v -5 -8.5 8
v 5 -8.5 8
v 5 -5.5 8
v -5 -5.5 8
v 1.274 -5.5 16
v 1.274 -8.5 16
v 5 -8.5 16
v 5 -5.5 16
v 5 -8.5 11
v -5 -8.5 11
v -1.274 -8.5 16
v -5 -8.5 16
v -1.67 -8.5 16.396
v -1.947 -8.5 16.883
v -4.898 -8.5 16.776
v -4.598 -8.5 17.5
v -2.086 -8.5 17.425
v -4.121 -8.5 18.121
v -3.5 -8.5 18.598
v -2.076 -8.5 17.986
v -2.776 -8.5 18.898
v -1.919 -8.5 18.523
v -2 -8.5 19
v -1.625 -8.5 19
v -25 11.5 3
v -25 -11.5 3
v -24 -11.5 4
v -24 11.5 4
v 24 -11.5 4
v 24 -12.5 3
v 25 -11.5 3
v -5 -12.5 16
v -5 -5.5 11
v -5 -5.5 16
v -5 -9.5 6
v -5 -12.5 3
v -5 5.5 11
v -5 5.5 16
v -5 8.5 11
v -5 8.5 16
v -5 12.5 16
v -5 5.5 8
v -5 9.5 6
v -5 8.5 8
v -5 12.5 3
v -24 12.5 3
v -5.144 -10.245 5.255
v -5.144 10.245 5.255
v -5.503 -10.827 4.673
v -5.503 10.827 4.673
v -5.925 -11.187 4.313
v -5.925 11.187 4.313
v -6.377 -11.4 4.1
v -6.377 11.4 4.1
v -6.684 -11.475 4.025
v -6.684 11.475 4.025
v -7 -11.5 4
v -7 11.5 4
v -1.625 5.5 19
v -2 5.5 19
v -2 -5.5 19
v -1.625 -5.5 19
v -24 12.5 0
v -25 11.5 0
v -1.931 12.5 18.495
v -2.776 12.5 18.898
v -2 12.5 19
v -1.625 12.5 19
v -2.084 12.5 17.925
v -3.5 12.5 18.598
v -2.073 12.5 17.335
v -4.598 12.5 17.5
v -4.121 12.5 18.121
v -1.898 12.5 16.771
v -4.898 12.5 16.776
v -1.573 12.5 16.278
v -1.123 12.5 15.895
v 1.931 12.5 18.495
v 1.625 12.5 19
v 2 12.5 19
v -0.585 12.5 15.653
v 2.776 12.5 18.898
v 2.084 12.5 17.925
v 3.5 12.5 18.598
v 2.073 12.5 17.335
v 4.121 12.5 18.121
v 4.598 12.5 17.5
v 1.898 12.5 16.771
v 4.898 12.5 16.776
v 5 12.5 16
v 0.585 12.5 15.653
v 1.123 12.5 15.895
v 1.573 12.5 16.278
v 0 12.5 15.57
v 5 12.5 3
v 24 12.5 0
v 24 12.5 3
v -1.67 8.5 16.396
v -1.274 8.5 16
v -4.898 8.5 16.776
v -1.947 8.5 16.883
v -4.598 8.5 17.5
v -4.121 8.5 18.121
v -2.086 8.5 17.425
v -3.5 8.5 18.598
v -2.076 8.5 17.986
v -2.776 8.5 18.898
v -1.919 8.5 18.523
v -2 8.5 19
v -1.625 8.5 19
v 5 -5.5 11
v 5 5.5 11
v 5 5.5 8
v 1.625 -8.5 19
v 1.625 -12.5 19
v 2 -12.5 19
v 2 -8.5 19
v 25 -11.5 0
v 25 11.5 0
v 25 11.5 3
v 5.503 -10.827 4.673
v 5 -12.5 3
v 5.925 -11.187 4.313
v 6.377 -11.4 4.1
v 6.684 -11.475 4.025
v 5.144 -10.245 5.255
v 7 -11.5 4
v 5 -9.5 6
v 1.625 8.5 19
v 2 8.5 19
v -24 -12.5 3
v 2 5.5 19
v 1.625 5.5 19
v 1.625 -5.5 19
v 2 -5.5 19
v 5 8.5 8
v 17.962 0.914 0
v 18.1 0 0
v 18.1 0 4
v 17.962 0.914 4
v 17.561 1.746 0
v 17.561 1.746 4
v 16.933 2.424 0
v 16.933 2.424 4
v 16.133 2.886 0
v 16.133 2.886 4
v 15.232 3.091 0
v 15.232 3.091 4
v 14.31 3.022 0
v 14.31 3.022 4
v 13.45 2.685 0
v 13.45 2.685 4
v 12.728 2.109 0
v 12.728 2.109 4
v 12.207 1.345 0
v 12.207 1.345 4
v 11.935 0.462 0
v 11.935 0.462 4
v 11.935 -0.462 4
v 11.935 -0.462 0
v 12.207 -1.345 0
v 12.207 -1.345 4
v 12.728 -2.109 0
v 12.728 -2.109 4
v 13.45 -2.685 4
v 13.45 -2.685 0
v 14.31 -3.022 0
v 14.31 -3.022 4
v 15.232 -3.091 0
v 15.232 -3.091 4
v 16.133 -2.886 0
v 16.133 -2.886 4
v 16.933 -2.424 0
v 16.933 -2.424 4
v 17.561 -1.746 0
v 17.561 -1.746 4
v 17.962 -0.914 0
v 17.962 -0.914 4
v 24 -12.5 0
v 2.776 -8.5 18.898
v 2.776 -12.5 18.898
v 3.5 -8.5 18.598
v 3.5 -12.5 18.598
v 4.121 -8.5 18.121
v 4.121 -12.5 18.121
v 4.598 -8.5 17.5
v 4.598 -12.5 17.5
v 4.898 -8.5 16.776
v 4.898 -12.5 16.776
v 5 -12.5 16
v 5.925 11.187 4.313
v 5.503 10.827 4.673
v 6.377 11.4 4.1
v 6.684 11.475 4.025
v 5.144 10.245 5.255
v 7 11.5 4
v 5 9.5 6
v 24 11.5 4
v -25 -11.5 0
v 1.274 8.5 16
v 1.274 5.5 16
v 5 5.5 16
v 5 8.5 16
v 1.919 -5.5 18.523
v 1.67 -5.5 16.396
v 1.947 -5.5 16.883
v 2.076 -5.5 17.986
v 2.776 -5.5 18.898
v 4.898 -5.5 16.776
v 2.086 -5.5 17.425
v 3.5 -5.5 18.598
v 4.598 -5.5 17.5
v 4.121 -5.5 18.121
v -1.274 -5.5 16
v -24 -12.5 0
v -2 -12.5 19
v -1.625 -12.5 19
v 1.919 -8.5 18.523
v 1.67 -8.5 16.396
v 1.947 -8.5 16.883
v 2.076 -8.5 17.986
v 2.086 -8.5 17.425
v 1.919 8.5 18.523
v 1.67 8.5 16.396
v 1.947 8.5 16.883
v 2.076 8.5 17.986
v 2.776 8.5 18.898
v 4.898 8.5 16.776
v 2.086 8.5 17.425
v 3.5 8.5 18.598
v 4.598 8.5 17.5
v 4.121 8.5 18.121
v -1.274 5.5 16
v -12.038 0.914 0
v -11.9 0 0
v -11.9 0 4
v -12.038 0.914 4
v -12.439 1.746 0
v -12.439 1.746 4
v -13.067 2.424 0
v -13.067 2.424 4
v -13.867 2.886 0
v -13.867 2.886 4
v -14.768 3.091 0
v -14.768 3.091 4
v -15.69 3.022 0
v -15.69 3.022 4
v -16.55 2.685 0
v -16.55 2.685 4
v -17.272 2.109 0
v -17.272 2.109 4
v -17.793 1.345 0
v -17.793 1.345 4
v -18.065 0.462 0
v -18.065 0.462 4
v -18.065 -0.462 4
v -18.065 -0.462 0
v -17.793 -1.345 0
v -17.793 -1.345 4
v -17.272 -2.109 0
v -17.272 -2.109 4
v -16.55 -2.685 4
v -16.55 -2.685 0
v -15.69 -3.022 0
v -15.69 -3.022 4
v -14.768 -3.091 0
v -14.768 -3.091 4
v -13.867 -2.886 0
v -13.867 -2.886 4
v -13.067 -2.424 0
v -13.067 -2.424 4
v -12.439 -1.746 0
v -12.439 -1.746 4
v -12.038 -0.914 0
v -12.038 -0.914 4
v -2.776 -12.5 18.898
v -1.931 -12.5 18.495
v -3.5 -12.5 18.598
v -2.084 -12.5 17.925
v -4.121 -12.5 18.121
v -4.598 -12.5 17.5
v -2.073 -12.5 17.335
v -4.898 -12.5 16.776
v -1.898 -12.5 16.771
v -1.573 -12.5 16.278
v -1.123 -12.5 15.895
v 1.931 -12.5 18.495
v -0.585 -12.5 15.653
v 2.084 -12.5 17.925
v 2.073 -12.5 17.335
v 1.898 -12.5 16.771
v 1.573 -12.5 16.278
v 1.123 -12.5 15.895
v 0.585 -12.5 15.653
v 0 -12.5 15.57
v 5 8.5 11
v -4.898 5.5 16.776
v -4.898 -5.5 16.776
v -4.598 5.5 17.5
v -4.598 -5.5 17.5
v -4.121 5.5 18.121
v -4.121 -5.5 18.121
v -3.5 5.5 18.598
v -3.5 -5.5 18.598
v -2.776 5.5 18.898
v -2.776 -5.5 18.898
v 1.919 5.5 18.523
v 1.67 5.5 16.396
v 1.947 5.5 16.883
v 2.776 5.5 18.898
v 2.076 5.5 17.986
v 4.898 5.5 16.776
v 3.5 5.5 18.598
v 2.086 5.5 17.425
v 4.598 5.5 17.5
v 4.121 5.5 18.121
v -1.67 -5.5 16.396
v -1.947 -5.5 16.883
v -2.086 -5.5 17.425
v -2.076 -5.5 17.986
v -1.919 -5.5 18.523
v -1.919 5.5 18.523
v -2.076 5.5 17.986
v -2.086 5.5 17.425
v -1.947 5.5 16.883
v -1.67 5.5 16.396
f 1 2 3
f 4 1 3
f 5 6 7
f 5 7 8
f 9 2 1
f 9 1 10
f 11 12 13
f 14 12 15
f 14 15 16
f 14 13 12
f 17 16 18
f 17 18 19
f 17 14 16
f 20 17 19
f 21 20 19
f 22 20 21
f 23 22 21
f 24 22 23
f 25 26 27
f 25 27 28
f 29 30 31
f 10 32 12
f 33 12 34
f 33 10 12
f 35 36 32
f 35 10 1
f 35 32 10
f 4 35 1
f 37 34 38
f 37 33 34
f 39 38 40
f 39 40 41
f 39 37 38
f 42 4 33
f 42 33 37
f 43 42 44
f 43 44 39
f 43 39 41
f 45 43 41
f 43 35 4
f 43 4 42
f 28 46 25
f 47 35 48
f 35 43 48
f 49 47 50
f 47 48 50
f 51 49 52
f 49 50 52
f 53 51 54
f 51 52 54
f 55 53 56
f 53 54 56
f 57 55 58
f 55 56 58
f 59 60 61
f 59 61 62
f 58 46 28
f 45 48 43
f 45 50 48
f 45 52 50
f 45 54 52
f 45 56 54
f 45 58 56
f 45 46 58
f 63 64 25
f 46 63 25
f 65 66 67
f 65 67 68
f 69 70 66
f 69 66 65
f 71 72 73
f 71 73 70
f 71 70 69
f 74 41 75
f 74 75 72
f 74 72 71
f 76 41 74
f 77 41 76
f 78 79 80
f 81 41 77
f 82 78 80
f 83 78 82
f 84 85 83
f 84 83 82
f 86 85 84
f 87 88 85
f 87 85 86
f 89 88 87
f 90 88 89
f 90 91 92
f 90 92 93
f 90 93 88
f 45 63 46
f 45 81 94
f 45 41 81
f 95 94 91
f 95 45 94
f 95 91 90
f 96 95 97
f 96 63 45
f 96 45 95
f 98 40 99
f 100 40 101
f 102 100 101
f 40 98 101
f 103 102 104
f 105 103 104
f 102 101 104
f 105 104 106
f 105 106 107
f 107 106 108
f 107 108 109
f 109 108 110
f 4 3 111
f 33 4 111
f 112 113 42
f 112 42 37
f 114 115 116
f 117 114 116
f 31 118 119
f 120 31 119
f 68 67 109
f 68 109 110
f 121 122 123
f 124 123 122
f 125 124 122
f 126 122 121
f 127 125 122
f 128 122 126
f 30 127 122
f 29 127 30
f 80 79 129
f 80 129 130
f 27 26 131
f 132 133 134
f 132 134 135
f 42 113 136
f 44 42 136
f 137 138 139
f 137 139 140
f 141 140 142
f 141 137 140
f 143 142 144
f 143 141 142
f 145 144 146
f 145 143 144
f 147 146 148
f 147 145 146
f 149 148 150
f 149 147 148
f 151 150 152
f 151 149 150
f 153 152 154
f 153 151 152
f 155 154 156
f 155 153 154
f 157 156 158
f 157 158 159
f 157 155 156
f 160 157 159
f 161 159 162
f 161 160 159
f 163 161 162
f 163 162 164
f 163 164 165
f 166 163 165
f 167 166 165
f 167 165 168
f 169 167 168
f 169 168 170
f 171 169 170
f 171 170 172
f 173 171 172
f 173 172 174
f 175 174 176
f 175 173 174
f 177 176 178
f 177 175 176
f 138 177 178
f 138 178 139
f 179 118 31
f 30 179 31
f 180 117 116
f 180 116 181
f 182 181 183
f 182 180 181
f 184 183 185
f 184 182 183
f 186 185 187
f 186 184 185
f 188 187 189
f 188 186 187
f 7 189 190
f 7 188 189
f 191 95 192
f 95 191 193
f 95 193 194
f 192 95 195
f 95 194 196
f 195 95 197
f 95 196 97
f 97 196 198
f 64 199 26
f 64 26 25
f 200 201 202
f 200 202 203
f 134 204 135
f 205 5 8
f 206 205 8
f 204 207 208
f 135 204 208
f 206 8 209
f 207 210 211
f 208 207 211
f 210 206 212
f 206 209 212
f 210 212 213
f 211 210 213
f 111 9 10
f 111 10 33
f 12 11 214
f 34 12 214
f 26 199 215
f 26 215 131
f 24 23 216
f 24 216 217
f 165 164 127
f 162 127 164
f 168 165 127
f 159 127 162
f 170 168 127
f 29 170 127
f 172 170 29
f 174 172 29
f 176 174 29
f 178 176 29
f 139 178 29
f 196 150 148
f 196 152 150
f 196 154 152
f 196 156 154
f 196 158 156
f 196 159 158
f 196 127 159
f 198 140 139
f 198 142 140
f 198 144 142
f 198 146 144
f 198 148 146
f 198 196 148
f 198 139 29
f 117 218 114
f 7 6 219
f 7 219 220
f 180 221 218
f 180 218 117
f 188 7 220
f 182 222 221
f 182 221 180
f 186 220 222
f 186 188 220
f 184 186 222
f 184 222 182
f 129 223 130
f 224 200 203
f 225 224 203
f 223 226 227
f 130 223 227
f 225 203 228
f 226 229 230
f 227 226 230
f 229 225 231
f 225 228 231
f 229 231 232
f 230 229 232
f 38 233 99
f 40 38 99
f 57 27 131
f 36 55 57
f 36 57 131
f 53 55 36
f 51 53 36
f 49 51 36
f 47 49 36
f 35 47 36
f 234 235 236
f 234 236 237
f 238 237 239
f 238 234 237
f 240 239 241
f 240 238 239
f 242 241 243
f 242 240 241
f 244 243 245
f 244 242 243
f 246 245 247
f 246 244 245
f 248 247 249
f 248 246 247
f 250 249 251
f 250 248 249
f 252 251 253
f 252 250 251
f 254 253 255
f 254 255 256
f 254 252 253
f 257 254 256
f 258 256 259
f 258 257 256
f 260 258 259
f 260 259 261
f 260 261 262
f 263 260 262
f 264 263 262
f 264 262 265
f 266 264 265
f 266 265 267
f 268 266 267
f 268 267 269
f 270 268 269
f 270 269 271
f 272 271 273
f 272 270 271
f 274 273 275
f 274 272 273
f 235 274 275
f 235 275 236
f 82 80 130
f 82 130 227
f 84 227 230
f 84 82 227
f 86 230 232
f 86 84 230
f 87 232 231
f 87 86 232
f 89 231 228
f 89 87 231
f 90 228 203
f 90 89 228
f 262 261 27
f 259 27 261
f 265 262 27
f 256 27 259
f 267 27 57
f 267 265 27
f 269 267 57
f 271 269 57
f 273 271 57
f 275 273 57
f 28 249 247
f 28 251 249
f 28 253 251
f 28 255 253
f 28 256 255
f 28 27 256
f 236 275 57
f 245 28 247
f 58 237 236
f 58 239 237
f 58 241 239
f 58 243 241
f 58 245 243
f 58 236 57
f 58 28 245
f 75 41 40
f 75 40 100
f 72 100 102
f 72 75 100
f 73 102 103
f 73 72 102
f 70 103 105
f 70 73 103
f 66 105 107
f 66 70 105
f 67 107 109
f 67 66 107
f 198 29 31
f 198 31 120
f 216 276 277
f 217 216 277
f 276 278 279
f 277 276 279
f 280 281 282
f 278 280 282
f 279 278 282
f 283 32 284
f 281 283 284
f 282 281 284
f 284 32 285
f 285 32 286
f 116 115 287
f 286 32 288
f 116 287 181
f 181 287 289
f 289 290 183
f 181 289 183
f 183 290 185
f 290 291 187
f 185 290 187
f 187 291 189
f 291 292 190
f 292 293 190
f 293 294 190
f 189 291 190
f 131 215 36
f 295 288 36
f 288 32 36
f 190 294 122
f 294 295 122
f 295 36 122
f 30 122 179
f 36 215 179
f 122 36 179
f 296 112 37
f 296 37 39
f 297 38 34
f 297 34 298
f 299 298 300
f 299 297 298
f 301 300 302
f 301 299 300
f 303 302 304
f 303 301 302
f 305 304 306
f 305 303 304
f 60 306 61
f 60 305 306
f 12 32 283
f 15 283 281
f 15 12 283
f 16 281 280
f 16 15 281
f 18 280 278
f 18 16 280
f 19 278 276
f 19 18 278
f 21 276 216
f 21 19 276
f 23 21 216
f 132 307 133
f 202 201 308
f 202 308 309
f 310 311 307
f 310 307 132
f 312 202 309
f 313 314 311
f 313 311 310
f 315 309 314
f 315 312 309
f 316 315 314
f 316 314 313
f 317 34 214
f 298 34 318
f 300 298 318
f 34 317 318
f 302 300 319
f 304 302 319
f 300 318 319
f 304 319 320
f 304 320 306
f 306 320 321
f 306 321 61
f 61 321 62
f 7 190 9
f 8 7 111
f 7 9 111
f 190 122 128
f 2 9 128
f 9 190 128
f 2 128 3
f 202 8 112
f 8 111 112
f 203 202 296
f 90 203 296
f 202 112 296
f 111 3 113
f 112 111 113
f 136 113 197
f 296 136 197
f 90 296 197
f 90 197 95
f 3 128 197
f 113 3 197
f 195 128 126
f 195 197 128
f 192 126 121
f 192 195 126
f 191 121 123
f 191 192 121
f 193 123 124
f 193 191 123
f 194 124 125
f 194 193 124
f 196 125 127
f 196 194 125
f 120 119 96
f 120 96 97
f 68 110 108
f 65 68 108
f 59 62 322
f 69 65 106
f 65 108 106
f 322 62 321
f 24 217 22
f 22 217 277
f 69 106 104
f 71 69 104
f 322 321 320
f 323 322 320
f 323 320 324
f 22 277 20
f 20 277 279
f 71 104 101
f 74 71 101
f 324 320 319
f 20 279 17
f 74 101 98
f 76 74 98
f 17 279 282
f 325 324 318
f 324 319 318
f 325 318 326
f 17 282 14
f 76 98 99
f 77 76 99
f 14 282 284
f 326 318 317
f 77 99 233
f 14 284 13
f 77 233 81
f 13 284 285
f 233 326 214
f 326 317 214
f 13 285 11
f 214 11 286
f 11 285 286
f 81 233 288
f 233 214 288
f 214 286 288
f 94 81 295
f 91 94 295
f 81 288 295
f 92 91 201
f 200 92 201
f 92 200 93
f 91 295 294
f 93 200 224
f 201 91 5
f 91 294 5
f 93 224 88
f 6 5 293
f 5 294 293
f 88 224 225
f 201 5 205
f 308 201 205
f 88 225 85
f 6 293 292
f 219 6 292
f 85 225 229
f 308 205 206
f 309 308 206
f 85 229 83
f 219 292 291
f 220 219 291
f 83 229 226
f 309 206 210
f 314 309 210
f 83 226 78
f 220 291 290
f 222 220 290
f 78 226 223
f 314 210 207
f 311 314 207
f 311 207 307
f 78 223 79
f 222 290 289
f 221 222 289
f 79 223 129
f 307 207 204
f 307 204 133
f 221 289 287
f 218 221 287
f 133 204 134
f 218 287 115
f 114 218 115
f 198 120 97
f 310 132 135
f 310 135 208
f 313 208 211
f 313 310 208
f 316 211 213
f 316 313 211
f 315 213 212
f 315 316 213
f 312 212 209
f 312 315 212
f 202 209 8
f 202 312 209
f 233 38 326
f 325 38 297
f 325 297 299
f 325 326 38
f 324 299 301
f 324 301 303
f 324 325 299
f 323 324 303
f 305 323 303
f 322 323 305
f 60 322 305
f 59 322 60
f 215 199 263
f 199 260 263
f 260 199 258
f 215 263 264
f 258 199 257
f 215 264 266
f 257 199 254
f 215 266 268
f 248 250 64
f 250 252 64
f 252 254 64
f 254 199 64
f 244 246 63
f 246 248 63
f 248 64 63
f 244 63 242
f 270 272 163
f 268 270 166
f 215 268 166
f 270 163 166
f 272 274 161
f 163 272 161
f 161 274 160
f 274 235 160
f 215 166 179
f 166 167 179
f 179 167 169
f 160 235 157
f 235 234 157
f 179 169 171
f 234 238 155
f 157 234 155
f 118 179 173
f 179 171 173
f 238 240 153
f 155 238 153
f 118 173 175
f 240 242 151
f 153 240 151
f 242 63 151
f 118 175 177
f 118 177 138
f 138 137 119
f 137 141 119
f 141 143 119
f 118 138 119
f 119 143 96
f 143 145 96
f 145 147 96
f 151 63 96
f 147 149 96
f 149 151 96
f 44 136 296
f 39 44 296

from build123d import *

# Parameters (mm, degrees)
SKETCH_W        = 50
SKETCH_H        = 25
SKETCH_R        = 3.1
PAD_DEPTH       = 4
SKETCH001_W     = 10
SKETCH001_H     = 25
PAD001_DEPTH    = 15
SKETCH002_R     = 2.1
POCKET_DEPTH    = 25.001
FILLET_R        = 3
SKETCH003_W     = 3
SKETCH003_H     = 3
POCKET001_DEPTH = 30.001
CHAMFER_SIZE    = 1
FILLET001_R     = 2


with BuildPart() as part:
    # Sketch → Pad (new body)
    with BuildSketch(Plane.XY):
        Rectangle(SKETCH_W, SKETCH_H)
        with Locations((-15, 0)):
            Circle(SKETCH_R, mode=Mode.SUBTRACT)
        with Locations((15, 0)):
            Circle(SKETCH_R, mode=Mode.SUBTRACT)
    extrude(amount=PAD_DEPTH)

    # Sketch001 (on Face8 of Pad) → Pad001 (join)
    with BuildSketch(Plane.XY.offset(4)):
        Rectangle(SKETCH001_W, SKETCH001_H)
    extrude(amount=PAD001_DEPTH)

    # Sketch002 (on Face14 of Pad001) → Pocket (cut, through all)
    with BuildSketch(Plane.XZ.offset(12.5)):
        with Locations((0, 17.669756)):
            Circle(SKETCH002_R)
    extrude(amount=-POCKET_DEPTH, mode=Mode.SUBTRACT)

    # Fillet
    fillet_edges = [part.edges().sort_by_distance(p)[0] for p in [
        (5, 0, 19),
        (-5, 0, 19),
    ]]
    fillet(fillet_edges, radius=FILLET_R)

    # Sketch003 (on Face2 of Fillet) → Pocket001 (cut, through all)
    with BuildSketch(Plane.YZ.offset(5)):
        with Locations((-7, 17.5)):
            Rectangle(SKETCH003_W, SKETCH003_H)
        with Locations((7, 17.5)):
            Rectangle(SKETCH003_W, SKETCH003_H)
        with Locations((-7, 9.5)):
            Rectangle(SKETCH003_W, SKETCH003_H)
        with Locations((7, 9.5)):
            Rectangle(SKETCH003_W, SKETCH003_H)
    extrude(amount=-POCKET001_DEPTH, mode=Mode.SUBTRACT)

    # Chamfer
    chamfer_edges = [part.edges().sort_by_distance(p)[0] for p in [
        (-25, -12.5, 2),
        (25, -12.5, 2),
        (25, 12.5, 2),
        (-25, 12.5, 2),
        (-15, 12.5, 4),
        (-25, 0, 4),
        (-15, -12.5, 4),
        (15, -12.5, 4),
        (25, 0, 4),
        (15, 12.5, 4),
    ]]
    chamfer(chamfer_edges, length=CHAMFER_SIZE)

    # Fillet001
    fillet001_edges = [part.edges().sort_by_distance(p)[0] for p in [
        (-5, 0, 4),
        (5, 0, 4),
    ]]
    fillet(fillet001_edges, radius=FILLET001_R)


solid = part.part
